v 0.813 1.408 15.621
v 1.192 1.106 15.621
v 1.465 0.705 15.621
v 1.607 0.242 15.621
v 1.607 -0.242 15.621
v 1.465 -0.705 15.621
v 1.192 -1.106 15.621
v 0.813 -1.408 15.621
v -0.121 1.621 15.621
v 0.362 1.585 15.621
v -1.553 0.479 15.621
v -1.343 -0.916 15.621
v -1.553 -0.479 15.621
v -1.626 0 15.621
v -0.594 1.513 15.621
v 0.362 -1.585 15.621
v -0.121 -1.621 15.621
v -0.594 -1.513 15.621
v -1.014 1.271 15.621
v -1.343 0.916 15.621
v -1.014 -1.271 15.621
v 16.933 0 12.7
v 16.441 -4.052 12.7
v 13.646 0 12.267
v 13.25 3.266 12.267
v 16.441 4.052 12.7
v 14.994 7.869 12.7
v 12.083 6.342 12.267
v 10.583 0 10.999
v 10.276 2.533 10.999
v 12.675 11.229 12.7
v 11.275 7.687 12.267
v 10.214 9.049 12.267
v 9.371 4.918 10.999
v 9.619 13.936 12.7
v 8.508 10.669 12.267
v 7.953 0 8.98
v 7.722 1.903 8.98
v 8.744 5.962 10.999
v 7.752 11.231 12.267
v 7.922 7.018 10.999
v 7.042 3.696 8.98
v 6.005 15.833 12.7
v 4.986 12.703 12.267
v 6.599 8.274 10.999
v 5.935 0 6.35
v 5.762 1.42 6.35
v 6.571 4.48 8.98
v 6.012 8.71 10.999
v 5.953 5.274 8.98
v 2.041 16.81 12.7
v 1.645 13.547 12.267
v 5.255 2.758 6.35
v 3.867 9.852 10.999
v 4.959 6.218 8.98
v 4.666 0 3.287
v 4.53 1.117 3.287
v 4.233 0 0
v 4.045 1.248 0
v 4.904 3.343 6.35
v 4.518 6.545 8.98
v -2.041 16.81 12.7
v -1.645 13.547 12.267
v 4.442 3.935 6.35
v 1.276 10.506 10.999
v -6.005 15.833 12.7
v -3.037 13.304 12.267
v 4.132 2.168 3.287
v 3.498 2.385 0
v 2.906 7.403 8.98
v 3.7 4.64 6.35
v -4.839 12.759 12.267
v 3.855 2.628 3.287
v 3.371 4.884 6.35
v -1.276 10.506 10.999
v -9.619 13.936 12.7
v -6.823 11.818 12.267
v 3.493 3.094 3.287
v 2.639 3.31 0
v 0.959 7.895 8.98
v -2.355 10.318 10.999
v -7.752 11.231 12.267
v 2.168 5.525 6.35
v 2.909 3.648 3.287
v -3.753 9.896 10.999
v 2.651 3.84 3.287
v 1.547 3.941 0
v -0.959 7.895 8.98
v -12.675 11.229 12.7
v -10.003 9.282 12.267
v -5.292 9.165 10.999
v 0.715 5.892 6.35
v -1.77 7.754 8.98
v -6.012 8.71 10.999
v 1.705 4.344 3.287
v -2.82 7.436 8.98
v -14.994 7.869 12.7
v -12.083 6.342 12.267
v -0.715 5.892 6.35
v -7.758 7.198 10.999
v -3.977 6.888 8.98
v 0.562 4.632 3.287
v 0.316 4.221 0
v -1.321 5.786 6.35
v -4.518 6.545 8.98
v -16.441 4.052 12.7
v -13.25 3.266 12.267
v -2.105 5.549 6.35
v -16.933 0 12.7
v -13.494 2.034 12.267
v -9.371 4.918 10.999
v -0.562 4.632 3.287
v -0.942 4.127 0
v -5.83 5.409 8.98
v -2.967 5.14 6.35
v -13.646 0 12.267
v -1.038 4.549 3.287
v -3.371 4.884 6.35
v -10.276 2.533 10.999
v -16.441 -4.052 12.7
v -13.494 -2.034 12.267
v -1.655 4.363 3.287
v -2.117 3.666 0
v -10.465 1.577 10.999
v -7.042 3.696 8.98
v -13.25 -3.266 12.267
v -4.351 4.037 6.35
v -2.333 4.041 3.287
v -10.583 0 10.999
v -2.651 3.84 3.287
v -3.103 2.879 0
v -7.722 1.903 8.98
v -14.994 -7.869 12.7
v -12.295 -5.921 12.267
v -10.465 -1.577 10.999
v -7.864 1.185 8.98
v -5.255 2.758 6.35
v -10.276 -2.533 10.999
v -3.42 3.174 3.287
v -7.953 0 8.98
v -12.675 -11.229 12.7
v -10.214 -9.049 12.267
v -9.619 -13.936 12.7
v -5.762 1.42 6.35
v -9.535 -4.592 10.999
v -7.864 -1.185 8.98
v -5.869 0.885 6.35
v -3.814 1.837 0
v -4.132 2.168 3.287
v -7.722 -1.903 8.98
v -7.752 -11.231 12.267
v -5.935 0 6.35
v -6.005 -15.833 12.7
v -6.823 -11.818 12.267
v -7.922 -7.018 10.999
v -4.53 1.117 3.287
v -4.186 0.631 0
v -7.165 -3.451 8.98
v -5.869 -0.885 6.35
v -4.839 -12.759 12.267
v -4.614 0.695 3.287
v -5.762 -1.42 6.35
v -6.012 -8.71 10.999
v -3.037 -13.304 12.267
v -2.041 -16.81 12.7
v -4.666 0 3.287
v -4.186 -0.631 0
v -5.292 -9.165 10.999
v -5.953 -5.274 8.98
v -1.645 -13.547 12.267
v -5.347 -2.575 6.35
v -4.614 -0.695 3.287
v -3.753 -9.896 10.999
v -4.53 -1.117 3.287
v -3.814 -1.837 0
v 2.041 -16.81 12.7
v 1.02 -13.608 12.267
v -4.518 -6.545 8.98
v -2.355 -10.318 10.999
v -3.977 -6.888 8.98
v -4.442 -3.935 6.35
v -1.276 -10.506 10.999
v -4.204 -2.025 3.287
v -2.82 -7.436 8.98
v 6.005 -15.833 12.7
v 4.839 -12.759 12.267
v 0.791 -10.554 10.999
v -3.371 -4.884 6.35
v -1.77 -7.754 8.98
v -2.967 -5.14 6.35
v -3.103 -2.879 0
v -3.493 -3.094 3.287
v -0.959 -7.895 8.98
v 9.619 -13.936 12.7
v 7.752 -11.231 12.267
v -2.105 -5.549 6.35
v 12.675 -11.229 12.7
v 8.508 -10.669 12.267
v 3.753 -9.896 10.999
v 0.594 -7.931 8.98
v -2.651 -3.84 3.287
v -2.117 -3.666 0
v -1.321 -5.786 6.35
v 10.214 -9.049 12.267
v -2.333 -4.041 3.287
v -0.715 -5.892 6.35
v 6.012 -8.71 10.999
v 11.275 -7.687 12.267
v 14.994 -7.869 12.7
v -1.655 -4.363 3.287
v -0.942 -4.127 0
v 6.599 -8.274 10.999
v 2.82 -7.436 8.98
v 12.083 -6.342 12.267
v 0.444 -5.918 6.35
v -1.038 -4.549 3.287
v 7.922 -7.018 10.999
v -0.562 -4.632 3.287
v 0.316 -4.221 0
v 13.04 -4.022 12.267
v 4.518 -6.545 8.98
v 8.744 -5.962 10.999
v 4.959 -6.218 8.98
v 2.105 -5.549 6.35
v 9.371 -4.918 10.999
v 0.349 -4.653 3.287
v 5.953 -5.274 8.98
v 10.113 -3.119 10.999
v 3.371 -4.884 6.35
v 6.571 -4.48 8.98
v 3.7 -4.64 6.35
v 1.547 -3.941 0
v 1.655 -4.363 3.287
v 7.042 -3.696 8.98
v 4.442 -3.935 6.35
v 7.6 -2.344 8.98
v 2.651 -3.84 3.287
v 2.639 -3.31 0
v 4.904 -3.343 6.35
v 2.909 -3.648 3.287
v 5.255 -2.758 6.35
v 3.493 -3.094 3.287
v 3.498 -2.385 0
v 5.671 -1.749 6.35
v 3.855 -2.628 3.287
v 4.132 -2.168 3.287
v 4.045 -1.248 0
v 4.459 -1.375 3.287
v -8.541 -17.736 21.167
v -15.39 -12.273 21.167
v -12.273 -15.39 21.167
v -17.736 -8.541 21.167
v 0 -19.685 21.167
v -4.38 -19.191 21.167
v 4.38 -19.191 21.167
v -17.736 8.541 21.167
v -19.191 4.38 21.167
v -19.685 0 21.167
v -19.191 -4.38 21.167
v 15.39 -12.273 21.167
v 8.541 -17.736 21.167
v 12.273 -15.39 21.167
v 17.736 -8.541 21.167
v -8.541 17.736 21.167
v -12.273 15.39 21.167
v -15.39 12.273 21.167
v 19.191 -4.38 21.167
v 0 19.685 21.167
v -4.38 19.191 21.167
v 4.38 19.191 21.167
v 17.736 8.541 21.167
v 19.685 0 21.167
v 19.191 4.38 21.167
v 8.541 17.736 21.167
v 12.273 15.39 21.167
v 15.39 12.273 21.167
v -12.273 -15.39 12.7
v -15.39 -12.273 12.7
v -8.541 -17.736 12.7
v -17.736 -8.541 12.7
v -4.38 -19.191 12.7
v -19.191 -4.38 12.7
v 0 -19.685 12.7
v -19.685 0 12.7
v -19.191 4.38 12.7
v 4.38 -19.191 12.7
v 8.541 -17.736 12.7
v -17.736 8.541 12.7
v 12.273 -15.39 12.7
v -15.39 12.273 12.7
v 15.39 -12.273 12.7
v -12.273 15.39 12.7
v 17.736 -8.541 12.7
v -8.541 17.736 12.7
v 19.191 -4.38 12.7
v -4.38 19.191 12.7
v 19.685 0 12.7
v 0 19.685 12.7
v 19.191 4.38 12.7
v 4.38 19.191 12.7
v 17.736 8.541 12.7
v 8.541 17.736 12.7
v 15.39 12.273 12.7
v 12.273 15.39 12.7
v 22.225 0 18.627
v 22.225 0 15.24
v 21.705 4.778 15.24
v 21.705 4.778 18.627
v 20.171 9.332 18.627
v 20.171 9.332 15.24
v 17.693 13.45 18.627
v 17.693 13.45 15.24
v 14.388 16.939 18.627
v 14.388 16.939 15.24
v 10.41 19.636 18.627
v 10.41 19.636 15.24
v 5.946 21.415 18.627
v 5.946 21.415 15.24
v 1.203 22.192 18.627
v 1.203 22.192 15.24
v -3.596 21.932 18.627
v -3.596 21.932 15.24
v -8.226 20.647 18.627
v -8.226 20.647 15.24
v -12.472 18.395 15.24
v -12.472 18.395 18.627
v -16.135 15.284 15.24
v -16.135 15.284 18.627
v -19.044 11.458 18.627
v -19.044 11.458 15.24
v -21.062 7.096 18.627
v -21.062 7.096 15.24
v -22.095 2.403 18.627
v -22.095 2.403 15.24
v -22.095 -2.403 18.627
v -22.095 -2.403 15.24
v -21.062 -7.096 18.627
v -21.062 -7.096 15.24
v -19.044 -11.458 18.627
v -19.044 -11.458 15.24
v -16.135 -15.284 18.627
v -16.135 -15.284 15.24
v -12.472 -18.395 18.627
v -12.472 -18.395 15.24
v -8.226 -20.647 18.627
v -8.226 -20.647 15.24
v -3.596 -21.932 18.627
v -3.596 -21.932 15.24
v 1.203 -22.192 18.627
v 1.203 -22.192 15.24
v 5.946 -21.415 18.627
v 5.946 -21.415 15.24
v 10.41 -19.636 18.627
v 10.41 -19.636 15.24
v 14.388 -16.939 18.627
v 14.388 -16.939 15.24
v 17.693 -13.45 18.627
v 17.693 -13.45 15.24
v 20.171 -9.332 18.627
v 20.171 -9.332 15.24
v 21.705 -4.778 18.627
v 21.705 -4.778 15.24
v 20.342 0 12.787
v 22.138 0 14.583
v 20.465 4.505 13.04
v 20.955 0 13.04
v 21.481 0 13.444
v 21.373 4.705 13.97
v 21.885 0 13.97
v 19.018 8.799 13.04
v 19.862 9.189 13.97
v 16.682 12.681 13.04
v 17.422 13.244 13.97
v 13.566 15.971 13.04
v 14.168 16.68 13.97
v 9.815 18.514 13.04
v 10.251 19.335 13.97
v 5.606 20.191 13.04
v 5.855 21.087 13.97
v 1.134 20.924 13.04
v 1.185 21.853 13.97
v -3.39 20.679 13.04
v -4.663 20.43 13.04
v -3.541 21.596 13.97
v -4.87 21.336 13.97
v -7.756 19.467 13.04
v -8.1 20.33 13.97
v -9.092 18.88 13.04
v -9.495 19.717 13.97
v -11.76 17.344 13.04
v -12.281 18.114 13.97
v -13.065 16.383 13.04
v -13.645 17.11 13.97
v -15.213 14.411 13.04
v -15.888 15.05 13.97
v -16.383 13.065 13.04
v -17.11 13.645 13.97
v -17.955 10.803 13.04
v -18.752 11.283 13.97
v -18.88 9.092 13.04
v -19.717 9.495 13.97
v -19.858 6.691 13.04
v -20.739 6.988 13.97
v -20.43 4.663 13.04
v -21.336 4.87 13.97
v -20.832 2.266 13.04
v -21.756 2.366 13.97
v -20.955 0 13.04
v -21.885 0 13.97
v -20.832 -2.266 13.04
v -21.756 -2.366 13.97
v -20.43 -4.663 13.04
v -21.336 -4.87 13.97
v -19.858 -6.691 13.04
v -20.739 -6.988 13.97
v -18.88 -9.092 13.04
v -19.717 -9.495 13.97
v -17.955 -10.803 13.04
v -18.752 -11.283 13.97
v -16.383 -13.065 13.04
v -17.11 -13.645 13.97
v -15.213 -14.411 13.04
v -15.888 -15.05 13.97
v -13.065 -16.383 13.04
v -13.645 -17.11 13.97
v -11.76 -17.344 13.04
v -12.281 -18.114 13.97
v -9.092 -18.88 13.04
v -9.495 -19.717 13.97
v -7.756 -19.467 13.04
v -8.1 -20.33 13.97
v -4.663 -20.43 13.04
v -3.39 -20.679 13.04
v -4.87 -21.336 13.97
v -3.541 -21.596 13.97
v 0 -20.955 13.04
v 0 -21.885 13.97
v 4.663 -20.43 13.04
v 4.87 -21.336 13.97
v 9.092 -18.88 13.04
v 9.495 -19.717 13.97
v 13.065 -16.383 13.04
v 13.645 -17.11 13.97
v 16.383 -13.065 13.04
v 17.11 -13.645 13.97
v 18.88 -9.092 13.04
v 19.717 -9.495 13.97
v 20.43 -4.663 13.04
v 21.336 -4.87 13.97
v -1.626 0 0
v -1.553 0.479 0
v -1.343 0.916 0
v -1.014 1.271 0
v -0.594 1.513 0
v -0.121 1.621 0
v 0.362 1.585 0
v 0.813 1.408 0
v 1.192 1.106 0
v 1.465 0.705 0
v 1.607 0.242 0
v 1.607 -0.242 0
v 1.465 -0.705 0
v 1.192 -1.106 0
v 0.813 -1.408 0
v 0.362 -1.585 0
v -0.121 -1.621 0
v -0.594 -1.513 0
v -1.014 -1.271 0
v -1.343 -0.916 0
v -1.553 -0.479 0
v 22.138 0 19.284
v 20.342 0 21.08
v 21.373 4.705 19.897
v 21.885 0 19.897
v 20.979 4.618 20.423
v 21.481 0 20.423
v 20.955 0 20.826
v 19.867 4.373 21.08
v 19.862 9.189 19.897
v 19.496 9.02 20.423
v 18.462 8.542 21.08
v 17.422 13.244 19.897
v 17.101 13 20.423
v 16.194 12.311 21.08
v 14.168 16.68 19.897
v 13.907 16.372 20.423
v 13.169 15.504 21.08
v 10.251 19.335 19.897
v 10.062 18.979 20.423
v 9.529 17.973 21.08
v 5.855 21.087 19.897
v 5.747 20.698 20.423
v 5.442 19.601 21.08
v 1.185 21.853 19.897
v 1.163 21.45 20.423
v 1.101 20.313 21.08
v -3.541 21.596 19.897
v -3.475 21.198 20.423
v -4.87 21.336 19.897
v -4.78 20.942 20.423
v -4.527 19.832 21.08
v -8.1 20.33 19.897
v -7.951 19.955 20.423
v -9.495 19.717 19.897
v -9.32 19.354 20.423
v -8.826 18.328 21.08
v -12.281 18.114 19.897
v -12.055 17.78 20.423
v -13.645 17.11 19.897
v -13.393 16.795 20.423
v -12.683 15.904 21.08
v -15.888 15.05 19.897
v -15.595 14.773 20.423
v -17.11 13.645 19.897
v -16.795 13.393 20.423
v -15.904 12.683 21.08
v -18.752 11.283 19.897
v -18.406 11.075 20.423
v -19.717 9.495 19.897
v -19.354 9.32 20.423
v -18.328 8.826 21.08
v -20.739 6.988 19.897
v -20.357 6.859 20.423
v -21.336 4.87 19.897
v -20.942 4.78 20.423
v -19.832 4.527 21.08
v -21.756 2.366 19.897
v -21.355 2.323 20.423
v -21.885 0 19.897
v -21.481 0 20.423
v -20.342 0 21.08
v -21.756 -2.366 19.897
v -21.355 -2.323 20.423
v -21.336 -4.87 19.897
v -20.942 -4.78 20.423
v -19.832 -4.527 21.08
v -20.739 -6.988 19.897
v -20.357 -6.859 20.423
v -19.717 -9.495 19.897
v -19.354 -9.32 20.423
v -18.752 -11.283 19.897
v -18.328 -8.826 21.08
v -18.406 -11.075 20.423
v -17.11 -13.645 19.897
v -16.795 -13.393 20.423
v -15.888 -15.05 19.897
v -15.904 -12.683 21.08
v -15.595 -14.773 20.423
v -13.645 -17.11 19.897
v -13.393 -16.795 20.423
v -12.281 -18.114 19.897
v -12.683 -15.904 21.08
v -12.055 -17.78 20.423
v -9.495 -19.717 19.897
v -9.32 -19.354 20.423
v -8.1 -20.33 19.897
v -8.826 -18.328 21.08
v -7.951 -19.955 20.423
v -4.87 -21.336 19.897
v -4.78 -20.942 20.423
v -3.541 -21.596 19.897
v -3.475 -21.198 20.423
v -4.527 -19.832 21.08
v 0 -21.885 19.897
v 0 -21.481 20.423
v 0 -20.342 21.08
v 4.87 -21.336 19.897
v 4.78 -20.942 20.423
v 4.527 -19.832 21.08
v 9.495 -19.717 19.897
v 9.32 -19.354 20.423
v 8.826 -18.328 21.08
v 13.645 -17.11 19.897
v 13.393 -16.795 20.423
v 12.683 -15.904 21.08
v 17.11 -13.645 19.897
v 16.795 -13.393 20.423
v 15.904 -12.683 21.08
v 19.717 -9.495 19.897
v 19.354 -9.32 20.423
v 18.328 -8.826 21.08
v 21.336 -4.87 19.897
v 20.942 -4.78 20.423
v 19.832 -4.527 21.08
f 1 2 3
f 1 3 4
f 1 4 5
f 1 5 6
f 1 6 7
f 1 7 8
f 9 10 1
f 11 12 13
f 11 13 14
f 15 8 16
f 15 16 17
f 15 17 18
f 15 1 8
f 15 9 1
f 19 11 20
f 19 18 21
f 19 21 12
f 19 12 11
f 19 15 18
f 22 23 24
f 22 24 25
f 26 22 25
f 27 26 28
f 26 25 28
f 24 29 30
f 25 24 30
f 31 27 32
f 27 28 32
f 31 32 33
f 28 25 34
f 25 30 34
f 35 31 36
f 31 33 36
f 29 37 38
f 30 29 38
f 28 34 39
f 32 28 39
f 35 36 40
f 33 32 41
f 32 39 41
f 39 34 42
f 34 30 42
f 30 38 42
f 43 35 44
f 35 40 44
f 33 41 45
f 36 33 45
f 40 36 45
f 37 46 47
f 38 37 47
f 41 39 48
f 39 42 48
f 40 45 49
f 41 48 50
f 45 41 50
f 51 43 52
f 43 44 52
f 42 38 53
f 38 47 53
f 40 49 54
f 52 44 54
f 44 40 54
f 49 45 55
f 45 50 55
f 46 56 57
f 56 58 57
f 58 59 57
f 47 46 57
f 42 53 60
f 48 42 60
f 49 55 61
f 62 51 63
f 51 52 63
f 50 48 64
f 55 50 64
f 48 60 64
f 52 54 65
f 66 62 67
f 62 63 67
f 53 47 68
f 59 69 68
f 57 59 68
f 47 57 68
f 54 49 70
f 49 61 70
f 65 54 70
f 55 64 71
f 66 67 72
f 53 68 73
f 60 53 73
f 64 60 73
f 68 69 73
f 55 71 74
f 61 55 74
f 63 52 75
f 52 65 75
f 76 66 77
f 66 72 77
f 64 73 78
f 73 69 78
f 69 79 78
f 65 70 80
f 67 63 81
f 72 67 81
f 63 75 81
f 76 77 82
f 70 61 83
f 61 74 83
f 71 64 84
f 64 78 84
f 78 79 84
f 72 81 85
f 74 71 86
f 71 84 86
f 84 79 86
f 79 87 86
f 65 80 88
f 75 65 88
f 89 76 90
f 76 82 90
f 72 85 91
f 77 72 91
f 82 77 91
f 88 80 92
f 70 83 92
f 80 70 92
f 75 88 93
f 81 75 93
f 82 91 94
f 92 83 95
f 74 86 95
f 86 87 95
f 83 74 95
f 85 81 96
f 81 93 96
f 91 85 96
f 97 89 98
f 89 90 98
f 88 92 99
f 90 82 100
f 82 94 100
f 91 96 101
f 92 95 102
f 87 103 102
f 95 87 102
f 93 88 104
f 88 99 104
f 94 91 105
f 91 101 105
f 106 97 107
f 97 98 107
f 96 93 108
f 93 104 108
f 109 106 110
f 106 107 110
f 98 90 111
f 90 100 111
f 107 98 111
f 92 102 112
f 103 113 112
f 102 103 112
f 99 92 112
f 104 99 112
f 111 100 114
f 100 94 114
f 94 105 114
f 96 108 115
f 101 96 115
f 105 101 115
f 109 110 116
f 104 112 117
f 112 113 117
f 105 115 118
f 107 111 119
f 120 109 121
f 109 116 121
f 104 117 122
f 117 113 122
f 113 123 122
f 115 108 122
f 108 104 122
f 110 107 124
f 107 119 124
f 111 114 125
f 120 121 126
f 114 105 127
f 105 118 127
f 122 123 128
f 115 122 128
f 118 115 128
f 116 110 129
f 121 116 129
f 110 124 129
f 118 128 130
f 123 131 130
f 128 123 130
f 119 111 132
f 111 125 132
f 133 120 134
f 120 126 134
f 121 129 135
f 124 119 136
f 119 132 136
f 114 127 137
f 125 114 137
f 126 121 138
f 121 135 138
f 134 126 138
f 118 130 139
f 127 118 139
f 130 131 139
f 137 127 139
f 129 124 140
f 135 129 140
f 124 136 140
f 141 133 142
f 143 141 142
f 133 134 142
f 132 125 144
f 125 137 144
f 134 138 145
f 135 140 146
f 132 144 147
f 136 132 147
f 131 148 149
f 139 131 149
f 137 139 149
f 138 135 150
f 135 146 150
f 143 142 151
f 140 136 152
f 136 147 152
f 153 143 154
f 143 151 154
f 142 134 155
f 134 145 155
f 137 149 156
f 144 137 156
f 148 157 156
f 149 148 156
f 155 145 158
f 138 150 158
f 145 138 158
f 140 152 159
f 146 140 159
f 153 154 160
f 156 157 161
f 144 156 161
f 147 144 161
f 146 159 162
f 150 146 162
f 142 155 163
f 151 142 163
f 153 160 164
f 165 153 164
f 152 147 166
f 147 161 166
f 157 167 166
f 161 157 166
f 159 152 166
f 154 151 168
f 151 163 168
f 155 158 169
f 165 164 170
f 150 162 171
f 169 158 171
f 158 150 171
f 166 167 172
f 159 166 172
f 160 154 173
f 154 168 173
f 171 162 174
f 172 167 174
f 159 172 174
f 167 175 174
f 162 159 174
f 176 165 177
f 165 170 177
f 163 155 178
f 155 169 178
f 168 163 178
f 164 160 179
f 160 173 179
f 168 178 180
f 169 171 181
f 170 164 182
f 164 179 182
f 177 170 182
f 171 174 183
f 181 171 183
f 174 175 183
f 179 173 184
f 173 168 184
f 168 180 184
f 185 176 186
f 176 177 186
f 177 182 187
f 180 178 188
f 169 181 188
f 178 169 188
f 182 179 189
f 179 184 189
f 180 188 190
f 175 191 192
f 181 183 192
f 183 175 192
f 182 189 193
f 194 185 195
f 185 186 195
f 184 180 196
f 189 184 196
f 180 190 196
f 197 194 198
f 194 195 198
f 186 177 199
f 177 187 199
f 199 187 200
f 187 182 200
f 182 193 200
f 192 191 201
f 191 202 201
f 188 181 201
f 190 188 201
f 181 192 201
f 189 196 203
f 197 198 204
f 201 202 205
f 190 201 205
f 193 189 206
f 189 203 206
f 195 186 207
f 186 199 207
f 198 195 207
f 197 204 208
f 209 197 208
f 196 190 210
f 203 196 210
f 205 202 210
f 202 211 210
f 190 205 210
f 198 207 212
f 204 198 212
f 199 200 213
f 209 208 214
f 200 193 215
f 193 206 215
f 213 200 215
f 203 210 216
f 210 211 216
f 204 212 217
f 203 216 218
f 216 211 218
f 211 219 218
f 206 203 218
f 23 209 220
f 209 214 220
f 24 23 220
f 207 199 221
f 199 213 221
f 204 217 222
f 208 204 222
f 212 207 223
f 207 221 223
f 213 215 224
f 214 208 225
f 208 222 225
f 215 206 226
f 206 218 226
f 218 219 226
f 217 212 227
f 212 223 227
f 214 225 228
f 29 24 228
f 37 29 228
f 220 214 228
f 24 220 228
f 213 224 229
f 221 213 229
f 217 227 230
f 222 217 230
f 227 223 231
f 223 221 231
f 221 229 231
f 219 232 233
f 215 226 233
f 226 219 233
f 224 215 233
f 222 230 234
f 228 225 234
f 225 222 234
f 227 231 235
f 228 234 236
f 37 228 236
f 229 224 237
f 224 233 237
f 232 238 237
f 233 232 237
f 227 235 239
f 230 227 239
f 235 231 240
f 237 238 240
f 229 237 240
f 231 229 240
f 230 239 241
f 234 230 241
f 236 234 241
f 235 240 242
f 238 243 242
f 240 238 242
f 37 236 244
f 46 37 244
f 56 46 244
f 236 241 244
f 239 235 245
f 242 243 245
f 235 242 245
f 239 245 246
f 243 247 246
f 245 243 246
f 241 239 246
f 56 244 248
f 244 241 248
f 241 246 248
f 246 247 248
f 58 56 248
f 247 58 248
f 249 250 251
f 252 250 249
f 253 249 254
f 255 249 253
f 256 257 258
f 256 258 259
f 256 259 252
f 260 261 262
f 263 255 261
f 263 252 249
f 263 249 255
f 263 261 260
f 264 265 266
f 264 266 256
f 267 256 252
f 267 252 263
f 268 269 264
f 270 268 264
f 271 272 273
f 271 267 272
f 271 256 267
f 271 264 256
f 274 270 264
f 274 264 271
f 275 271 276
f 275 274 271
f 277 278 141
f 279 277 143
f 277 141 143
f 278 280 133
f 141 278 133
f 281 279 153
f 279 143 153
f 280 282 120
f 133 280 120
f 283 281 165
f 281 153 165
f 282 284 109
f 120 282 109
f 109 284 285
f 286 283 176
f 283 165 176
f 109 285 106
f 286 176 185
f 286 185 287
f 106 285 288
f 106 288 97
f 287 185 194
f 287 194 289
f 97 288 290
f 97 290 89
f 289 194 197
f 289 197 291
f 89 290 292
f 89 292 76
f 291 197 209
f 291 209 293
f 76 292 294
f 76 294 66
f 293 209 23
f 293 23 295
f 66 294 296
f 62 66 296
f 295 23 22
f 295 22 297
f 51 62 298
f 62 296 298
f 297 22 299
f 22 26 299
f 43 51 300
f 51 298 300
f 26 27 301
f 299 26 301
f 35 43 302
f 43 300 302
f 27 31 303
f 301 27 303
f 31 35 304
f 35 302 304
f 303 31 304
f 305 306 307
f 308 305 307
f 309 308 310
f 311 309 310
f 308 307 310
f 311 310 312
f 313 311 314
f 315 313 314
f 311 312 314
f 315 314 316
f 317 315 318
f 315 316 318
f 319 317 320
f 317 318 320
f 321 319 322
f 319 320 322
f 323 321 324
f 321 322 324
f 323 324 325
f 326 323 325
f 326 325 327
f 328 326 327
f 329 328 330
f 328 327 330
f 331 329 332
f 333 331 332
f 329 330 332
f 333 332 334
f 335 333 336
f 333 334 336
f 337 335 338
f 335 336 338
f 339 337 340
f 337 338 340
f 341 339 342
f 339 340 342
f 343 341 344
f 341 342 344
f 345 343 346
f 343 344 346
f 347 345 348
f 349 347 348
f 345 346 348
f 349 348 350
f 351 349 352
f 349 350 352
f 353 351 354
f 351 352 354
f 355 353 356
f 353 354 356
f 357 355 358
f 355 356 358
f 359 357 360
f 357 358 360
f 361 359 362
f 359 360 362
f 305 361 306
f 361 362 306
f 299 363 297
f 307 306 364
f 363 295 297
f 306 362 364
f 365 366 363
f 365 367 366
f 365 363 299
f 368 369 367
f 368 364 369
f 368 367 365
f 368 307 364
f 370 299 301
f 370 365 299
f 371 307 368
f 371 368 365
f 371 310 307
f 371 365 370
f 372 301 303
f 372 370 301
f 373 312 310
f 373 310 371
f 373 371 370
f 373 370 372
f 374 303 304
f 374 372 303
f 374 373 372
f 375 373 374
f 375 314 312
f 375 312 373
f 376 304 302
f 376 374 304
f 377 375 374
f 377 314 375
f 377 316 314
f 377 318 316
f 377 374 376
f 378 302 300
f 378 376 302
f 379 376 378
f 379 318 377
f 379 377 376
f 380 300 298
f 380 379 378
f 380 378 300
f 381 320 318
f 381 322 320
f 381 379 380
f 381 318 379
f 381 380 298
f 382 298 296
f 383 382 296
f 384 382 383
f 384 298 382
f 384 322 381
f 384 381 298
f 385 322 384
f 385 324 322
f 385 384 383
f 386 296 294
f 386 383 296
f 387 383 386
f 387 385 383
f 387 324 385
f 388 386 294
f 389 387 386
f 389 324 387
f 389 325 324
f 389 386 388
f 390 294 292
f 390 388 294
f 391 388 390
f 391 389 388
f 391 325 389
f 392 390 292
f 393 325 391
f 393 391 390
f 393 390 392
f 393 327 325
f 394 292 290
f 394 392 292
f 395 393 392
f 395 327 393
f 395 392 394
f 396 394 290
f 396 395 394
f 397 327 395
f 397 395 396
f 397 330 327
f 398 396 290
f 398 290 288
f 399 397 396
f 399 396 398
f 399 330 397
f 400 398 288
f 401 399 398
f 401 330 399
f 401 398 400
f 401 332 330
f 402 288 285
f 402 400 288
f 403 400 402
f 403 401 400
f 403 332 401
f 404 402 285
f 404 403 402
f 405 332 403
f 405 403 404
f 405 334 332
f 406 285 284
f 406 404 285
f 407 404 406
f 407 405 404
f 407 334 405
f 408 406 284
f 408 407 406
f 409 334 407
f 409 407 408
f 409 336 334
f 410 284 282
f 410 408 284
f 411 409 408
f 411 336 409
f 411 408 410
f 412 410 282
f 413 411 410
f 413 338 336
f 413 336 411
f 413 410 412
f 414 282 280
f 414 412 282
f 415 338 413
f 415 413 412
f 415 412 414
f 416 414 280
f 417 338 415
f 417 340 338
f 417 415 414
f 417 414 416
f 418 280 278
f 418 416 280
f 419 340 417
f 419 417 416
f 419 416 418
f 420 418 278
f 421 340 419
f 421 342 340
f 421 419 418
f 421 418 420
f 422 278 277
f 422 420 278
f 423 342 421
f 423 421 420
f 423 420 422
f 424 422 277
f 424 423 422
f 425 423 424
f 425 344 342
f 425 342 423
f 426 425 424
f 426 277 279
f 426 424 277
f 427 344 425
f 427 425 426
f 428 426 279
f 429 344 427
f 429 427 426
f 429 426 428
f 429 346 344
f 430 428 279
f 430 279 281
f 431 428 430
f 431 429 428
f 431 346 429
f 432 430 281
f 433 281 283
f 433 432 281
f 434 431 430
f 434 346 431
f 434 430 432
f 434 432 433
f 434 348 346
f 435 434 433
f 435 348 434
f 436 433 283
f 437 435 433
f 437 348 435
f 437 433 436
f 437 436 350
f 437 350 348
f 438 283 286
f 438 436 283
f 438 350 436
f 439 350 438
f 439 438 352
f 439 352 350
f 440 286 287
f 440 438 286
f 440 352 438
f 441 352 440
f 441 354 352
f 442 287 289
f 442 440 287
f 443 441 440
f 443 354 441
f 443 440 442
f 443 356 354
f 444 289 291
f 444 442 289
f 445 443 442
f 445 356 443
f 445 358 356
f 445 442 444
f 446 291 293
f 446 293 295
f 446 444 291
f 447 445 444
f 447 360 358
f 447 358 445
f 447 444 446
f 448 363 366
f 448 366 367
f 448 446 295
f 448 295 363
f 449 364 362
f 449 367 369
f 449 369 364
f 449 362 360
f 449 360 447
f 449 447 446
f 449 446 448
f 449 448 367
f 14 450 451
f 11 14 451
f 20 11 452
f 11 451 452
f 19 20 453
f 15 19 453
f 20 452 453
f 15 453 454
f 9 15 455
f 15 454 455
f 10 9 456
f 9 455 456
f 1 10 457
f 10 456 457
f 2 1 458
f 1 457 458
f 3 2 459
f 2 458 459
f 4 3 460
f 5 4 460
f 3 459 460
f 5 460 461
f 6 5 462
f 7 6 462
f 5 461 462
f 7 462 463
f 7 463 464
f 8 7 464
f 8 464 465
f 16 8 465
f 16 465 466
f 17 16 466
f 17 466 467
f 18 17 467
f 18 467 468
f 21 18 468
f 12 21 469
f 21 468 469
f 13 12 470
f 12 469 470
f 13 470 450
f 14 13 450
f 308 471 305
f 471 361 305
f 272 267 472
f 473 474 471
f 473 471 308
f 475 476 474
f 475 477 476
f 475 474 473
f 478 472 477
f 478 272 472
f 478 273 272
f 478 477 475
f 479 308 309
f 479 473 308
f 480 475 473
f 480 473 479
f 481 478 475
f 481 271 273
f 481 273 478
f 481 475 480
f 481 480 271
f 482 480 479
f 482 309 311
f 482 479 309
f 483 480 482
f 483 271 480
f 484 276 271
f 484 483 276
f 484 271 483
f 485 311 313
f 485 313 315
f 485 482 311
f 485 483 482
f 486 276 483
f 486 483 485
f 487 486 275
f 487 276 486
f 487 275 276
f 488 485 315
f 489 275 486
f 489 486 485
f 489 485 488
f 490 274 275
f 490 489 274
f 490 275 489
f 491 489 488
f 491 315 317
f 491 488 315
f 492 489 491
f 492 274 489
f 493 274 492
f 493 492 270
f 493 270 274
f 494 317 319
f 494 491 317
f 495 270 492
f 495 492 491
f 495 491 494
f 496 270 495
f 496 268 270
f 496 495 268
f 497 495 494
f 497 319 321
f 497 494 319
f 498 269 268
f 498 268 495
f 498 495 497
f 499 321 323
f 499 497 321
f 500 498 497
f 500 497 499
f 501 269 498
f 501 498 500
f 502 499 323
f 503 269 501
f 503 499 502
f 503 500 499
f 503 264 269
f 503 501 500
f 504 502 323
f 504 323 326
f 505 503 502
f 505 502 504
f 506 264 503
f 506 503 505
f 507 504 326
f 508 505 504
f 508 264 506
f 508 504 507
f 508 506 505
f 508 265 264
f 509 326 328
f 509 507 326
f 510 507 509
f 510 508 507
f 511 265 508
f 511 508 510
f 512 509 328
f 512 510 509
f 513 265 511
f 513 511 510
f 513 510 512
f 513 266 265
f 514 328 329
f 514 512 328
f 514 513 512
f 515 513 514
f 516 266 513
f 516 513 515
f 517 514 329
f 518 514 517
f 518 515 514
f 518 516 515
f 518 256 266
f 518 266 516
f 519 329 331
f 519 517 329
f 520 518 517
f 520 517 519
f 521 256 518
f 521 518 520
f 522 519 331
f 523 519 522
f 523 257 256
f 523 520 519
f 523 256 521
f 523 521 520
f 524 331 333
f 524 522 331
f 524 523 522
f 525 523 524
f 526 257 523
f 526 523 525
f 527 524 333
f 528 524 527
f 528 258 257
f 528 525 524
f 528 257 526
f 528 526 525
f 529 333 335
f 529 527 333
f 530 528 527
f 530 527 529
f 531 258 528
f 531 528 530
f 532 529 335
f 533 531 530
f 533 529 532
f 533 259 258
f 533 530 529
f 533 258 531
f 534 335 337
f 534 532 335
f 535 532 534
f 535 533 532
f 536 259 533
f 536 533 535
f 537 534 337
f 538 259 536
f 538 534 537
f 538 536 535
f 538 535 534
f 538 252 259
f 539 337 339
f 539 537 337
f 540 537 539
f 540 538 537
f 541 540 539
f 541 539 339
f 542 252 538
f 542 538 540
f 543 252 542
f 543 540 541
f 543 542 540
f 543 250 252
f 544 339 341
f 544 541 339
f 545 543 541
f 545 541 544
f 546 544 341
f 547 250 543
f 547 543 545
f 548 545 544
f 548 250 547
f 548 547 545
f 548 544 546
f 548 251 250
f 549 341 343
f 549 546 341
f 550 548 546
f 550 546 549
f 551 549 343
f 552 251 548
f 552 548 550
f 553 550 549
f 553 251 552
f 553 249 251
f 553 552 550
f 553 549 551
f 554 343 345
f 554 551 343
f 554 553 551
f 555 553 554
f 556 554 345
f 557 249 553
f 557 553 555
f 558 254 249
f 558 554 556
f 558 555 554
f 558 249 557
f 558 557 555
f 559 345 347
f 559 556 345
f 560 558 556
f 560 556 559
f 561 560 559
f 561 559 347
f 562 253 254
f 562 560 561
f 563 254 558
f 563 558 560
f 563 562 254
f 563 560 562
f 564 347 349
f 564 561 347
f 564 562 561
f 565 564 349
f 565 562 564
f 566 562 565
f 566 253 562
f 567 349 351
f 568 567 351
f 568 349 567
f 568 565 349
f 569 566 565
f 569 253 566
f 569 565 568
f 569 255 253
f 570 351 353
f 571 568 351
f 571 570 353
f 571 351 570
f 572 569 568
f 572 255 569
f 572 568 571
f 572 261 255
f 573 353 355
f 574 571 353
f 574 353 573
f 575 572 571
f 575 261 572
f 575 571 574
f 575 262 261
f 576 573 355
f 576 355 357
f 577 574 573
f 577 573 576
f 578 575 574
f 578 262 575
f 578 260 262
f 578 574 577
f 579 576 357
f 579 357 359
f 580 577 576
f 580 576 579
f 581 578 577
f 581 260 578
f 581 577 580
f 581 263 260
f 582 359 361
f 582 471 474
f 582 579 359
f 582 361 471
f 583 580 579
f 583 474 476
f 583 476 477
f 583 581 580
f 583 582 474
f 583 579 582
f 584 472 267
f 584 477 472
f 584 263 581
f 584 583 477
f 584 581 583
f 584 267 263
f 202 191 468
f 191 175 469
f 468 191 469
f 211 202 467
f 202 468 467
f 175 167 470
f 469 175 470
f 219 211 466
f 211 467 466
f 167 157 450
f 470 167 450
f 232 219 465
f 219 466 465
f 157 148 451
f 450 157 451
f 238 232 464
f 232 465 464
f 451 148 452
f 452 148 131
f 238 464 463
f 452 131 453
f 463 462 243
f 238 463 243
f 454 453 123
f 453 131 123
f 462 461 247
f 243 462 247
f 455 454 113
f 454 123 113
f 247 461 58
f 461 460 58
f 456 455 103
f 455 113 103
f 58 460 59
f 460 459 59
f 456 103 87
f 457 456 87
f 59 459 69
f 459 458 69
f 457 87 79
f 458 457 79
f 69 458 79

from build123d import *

# Parameters (mm, degrees)
SKETCH1_R           = 4.233333333
BOSS_EXTRUDE1_DEPTH = 12.7
SKETCH2_R           = 22.225
BOSS_EXTRUDE3_DEPTH = 8.466666667
FILLET1_R           = 12.7
FILLET2_R           = 2.54
SKETCH5_R           = 1.6256
CUT_EXTRUDE2_DEPTH  = 15.621


with BuildPart() as part:
    # Sketch1 → Boss-Extrude1 (new body)
    with BuildSketch(Plane.XY):
        Circle(SKETCH1_R)
    extrude(amount=BOSS_EXTRUDE1_DEPTH)

    # Sketch2 → Boss-Extrude3 (add)
    with BuildSketch(Plane.XY.offset(12.7)):
        Circle(SKETCH2_R)
    extrude(amount=BOSS_EXTRUDE3_DEPTH)

    # Fillet1
    fillet1_edges = [part.edges().sort_by_distance(p)[0] for p in [
        (-4.233333333, 0, 12.7),
    ]]
    fillet(fillet1_edges, radius=FILLET1_R - 0.0001)  # a hair under: the kernel refuses the full size

    # Fillet2
    fillet2_edges = [part.edges().sort_by_distance(p)[0] for p in [
        (-22.225, 0, 12.7),
        (-22.225, 0, 21.166666667),
    ]]
    fillet(fillet2_edges, radius=FILLET2_R)

    # Sketch5 → Cut-Extrude2 (cut)
    with BuildSketch(Plane(origin=(0, 0, 0), x_dir=(-1, 0, 0), z_dir=(0, 0, -1))):
        Circle(SKETCH5_R)
    extrude(amount=-CUT_EXTRUDE2_DEPTH, mode=Mode.SUBTRACT)


solid = part.part
